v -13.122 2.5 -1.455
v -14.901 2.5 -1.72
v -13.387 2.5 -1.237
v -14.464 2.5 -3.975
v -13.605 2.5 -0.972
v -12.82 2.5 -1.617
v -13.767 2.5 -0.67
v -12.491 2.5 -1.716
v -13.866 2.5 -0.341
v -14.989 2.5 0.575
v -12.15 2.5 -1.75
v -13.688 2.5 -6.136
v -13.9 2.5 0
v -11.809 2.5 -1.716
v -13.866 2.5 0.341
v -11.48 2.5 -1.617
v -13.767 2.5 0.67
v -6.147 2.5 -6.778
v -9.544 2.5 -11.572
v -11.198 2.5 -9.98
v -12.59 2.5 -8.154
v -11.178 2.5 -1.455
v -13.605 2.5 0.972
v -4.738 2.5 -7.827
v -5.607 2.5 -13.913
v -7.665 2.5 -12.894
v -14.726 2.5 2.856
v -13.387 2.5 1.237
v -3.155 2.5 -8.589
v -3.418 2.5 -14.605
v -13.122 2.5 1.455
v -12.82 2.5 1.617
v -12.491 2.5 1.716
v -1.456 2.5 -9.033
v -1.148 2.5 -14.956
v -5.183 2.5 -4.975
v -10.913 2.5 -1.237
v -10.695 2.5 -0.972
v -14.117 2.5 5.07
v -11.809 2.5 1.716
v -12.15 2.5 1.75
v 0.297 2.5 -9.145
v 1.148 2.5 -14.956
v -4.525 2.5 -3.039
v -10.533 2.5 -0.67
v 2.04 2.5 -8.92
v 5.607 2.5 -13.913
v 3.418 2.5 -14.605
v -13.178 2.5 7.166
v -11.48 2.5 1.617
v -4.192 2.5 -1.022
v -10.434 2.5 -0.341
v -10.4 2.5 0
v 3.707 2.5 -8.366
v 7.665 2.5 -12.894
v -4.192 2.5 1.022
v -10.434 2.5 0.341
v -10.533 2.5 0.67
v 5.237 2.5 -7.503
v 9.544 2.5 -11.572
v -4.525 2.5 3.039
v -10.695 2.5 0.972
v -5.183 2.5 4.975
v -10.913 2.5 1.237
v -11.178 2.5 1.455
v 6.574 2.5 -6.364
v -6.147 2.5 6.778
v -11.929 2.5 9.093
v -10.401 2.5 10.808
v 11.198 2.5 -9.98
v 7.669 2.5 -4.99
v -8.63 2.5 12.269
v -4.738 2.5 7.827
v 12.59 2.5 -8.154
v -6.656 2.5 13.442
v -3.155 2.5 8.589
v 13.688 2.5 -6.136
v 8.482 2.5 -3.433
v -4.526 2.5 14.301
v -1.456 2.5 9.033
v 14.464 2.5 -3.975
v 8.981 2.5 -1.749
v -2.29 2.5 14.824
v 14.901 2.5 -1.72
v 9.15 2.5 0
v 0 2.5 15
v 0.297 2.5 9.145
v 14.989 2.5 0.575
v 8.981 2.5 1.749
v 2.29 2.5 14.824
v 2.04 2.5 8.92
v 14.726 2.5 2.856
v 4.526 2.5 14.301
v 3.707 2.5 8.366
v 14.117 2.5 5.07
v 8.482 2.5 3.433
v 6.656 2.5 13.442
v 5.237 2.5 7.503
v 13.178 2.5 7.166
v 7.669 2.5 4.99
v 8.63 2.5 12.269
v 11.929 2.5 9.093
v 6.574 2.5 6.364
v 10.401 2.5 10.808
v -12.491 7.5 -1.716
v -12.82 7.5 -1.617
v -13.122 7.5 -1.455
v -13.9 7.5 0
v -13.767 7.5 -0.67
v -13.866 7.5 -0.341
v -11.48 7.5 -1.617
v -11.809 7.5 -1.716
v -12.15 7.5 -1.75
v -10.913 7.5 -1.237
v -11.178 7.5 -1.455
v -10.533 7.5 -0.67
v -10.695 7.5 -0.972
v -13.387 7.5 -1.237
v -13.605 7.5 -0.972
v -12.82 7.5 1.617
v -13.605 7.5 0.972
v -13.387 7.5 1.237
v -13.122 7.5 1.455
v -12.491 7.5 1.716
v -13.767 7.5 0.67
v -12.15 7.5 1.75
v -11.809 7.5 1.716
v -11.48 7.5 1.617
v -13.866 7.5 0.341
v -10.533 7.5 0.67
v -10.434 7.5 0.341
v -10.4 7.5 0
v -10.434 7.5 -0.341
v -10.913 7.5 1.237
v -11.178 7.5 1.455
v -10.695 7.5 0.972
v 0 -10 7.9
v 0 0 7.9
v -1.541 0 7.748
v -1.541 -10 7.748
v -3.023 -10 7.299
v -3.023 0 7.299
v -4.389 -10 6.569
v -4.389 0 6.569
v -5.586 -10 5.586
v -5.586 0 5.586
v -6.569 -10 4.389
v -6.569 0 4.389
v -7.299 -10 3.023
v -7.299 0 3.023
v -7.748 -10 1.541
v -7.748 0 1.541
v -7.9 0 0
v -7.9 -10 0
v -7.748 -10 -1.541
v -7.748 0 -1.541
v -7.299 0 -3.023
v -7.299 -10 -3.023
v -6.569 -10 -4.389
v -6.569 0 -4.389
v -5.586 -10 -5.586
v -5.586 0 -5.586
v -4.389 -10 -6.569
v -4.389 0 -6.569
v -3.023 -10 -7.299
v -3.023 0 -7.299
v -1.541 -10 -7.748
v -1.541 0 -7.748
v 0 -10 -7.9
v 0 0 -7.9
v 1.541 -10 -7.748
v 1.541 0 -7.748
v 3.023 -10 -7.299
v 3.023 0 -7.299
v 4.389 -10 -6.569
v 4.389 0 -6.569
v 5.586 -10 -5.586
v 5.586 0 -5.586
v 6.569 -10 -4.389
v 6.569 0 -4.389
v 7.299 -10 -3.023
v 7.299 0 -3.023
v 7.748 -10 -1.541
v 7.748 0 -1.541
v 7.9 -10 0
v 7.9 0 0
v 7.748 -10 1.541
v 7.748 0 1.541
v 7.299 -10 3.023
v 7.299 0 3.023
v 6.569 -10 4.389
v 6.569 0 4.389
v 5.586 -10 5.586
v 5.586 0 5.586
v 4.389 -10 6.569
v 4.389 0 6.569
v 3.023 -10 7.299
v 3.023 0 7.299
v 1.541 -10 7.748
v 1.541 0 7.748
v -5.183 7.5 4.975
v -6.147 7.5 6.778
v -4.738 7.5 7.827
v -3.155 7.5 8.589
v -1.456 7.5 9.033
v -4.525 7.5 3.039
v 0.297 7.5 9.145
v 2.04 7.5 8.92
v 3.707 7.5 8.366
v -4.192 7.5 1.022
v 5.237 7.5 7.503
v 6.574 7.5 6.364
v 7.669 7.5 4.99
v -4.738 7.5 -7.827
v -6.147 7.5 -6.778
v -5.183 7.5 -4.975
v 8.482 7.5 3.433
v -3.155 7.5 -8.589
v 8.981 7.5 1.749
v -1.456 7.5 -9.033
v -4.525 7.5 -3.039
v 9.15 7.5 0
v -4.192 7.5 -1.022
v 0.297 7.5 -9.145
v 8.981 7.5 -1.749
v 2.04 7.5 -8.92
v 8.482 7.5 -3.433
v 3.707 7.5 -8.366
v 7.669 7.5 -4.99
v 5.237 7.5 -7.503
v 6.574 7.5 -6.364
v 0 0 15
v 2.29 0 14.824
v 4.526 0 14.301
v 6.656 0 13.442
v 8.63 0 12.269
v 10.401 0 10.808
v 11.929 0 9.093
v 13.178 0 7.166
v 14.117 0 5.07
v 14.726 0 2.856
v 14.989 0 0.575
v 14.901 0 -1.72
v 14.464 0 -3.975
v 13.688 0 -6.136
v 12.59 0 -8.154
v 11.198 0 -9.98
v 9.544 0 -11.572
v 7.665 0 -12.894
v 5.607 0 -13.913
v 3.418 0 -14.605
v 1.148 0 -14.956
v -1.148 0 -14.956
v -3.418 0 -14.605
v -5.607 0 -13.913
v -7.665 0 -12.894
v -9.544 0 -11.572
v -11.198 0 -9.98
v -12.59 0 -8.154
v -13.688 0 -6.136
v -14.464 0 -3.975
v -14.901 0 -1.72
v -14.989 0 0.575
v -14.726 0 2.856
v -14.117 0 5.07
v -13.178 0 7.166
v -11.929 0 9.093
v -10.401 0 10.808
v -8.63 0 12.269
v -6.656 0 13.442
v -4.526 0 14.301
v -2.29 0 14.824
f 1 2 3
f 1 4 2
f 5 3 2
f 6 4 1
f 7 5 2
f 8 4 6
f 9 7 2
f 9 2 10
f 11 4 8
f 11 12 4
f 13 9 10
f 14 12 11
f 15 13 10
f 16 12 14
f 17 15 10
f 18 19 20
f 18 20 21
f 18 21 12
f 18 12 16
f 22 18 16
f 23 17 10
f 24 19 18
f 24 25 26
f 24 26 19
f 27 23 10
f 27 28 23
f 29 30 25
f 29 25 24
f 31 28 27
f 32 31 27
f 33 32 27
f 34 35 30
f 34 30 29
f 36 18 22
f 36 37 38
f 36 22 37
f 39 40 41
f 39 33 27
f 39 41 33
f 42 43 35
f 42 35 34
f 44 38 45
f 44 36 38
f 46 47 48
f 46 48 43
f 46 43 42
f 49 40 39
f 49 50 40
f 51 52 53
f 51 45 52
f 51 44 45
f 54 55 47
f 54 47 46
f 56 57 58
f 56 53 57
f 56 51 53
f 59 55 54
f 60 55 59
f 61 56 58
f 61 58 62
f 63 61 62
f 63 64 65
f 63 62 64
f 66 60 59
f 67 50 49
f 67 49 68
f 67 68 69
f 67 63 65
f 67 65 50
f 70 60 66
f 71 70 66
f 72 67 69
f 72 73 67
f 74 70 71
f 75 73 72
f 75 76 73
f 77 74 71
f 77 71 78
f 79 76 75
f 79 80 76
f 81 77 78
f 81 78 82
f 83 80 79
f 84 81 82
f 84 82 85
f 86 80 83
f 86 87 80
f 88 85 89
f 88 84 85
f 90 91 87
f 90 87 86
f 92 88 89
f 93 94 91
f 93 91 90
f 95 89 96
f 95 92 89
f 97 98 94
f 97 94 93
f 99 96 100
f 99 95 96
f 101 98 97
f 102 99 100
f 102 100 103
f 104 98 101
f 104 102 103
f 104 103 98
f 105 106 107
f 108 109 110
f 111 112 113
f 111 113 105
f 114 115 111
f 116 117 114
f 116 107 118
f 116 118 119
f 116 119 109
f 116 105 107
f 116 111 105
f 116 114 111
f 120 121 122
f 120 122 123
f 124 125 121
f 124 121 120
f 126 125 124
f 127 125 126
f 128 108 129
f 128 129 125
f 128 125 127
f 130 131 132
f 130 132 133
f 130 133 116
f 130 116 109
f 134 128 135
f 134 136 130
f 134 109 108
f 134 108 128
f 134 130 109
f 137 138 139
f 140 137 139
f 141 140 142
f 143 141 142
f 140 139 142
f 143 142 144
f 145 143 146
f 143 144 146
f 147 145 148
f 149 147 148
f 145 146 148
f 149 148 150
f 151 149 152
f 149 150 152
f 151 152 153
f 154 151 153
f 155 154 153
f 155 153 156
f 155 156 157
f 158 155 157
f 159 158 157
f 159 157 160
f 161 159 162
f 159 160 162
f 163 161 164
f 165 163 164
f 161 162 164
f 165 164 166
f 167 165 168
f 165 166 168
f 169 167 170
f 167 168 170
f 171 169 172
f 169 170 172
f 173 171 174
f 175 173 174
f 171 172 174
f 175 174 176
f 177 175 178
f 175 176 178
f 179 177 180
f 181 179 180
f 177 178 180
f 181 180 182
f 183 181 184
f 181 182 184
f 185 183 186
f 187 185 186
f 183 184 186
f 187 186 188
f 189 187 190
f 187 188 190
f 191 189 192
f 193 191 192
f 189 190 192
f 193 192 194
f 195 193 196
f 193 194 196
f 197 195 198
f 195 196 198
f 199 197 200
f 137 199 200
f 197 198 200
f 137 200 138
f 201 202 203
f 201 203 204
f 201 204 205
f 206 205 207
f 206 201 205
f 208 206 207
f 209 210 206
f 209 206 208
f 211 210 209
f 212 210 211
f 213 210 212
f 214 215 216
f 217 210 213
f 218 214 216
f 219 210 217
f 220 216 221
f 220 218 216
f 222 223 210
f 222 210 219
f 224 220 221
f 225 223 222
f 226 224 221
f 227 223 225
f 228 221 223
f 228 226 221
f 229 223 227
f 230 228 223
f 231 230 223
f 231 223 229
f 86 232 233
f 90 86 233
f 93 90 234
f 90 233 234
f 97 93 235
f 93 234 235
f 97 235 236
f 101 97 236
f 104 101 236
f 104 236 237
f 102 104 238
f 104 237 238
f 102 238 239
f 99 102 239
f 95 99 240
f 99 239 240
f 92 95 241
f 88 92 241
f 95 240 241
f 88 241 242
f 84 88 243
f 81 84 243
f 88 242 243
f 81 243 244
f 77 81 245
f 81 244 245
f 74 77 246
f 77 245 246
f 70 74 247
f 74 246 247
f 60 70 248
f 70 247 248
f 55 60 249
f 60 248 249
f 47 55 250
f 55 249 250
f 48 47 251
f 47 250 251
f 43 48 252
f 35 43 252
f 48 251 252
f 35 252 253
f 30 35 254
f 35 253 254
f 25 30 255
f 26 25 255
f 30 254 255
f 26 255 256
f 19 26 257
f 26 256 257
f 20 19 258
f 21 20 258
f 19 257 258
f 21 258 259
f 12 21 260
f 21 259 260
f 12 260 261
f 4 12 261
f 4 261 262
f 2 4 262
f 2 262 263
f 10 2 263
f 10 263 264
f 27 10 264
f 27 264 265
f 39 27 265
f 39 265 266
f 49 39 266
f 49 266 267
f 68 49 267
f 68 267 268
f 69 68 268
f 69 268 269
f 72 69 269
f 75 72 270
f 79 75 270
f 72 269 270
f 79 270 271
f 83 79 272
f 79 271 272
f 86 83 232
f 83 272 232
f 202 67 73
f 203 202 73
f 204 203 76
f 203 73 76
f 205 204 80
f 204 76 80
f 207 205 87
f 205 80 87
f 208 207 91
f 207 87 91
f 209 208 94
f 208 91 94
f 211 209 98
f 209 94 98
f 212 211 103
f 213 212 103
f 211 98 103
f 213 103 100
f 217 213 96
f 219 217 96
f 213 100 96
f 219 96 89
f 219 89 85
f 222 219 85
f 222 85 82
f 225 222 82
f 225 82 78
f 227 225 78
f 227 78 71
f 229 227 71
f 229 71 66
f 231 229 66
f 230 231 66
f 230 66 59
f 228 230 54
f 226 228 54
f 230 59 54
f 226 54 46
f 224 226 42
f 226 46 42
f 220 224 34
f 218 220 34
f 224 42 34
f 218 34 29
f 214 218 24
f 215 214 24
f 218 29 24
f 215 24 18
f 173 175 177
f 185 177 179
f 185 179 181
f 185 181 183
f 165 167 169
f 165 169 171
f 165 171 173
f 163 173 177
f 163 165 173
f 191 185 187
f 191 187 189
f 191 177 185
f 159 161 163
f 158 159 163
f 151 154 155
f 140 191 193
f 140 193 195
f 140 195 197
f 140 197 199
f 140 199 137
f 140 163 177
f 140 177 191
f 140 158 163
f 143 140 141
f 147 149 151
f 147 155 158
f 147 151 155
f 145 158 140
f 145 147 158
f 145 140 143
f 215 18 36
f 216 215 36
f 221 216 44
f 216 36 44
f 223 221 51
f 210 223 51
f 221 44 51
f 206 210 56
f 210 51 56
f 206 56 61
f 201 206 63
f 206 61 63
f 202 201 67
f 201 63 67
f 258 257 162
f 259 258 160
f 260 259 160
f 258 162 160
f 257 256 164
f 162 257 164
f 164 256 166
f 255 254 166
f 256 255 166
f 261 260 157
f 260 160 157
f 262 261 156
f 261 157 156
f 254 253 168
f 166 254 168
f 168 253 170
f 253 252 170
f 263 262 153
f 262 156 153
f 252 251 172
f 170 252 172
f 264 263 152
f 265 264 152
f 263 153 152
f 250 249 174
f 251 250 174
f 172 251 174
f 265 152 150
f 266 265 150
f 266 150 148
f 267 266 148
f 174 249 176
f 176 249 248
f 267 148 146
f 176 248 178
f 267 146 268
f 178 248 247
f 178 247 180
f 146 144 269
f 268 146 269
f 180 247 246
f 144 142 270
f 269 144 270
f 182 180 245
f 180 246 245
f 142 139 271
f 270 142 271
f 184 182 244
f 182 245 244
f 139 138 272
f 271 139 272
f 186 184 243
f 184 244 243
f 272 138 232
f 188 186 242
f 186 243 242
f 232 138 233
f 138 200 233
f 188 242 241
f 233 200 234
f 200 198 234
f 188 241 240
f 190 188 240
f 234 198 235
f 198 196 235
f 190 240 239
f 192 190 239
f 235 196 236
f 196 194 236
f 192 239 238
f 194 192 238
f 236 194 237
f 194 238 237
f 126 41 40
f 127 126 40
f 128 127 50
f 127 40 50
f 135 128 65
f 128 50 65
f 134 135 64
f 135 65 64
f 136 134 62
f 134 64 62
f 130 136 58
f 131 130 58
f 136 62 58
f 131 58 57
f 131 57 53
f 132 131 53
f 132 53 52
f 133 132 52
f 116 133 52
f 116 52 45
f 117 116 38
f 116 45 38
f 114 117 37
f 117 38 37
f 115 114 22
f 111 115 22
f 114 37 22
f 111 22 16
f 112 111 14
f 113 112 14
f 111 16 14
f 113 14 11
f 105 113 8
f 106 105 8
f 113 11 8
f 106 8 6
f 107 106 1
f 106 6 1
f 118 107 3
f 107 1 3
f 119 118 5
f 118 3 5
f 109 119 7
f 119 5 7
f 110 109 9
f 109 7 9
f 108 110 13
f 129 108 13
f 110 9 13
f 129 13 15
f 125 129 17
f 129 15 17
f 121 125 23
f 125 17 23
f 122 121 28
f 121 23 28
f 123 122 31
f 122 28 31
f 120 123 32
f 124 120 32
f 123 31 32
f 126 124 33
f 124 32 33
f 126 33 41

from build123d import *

# Parameters (mm, degrees)
CROQUIS1_R              = 15
SALIENTE_EXTRUIR1_DEPTH = 2.5
SALIENTE_EXTRUIR2_START = 2.5
CROQUIS1_4_R            = 1.75
SALIENTE_EXTRUIR2_DEPTH = 5
CROQUIS2_R              = 7.9
SALIENTE_EXTRUIR3_DEPTH = 10


with BuildPart() as part:
    # Croquis1 → Saliente-Extruir1 (new body)
    with BuildSketch(Plane(origin=(0, 0, 0), x_dir=(1, 0, 0), z_dir=(0, 1, 0))):
        with Locations(Location((0, 0, 0), (0, 0, 270))):
            Circle(CROQUIS1_R)
    extrude(amount=SALIENTE_EXTRUIR1_DEPTH)

    # Croquis1<4> → Saliente-Extruir2 (add)
    with BuildSketch(Plane(origin=(0, 0, 0), x_dir=(1, 0, 0), z_dir=(0, 1, 0)).offset(SALIENTE_EXTRUIR2_START)):
        with Locations(Location((-12.15, 0, 0), (0, 0, 270))):
            Circle(CROQUIS1_4_R)
        with BuildLine():
            ThreePointArc((-6.146996997, -6.777678653), (9.15, 0), (-6.146996997, 6.777678653))
            ThreePointArc((-6.146996997, 6.777678653), (-4.15, 0), (-6.146996997, -6.777678653))
        make_face()
    extrude(amount=SALIENTE_EXTRUIR2_DEPTH)

    # Croquis2 → Saliente-Extruir3 (add)
    with BuildSketch(Plane.XZ):
        with Locations(Location((0, 0, 0), (0, 0, 90))):
            Circle(CROQUIS2_R)
    extrude(amount=SALIENTE_EXTRUIR3_DEPTH)


solid = part.part
